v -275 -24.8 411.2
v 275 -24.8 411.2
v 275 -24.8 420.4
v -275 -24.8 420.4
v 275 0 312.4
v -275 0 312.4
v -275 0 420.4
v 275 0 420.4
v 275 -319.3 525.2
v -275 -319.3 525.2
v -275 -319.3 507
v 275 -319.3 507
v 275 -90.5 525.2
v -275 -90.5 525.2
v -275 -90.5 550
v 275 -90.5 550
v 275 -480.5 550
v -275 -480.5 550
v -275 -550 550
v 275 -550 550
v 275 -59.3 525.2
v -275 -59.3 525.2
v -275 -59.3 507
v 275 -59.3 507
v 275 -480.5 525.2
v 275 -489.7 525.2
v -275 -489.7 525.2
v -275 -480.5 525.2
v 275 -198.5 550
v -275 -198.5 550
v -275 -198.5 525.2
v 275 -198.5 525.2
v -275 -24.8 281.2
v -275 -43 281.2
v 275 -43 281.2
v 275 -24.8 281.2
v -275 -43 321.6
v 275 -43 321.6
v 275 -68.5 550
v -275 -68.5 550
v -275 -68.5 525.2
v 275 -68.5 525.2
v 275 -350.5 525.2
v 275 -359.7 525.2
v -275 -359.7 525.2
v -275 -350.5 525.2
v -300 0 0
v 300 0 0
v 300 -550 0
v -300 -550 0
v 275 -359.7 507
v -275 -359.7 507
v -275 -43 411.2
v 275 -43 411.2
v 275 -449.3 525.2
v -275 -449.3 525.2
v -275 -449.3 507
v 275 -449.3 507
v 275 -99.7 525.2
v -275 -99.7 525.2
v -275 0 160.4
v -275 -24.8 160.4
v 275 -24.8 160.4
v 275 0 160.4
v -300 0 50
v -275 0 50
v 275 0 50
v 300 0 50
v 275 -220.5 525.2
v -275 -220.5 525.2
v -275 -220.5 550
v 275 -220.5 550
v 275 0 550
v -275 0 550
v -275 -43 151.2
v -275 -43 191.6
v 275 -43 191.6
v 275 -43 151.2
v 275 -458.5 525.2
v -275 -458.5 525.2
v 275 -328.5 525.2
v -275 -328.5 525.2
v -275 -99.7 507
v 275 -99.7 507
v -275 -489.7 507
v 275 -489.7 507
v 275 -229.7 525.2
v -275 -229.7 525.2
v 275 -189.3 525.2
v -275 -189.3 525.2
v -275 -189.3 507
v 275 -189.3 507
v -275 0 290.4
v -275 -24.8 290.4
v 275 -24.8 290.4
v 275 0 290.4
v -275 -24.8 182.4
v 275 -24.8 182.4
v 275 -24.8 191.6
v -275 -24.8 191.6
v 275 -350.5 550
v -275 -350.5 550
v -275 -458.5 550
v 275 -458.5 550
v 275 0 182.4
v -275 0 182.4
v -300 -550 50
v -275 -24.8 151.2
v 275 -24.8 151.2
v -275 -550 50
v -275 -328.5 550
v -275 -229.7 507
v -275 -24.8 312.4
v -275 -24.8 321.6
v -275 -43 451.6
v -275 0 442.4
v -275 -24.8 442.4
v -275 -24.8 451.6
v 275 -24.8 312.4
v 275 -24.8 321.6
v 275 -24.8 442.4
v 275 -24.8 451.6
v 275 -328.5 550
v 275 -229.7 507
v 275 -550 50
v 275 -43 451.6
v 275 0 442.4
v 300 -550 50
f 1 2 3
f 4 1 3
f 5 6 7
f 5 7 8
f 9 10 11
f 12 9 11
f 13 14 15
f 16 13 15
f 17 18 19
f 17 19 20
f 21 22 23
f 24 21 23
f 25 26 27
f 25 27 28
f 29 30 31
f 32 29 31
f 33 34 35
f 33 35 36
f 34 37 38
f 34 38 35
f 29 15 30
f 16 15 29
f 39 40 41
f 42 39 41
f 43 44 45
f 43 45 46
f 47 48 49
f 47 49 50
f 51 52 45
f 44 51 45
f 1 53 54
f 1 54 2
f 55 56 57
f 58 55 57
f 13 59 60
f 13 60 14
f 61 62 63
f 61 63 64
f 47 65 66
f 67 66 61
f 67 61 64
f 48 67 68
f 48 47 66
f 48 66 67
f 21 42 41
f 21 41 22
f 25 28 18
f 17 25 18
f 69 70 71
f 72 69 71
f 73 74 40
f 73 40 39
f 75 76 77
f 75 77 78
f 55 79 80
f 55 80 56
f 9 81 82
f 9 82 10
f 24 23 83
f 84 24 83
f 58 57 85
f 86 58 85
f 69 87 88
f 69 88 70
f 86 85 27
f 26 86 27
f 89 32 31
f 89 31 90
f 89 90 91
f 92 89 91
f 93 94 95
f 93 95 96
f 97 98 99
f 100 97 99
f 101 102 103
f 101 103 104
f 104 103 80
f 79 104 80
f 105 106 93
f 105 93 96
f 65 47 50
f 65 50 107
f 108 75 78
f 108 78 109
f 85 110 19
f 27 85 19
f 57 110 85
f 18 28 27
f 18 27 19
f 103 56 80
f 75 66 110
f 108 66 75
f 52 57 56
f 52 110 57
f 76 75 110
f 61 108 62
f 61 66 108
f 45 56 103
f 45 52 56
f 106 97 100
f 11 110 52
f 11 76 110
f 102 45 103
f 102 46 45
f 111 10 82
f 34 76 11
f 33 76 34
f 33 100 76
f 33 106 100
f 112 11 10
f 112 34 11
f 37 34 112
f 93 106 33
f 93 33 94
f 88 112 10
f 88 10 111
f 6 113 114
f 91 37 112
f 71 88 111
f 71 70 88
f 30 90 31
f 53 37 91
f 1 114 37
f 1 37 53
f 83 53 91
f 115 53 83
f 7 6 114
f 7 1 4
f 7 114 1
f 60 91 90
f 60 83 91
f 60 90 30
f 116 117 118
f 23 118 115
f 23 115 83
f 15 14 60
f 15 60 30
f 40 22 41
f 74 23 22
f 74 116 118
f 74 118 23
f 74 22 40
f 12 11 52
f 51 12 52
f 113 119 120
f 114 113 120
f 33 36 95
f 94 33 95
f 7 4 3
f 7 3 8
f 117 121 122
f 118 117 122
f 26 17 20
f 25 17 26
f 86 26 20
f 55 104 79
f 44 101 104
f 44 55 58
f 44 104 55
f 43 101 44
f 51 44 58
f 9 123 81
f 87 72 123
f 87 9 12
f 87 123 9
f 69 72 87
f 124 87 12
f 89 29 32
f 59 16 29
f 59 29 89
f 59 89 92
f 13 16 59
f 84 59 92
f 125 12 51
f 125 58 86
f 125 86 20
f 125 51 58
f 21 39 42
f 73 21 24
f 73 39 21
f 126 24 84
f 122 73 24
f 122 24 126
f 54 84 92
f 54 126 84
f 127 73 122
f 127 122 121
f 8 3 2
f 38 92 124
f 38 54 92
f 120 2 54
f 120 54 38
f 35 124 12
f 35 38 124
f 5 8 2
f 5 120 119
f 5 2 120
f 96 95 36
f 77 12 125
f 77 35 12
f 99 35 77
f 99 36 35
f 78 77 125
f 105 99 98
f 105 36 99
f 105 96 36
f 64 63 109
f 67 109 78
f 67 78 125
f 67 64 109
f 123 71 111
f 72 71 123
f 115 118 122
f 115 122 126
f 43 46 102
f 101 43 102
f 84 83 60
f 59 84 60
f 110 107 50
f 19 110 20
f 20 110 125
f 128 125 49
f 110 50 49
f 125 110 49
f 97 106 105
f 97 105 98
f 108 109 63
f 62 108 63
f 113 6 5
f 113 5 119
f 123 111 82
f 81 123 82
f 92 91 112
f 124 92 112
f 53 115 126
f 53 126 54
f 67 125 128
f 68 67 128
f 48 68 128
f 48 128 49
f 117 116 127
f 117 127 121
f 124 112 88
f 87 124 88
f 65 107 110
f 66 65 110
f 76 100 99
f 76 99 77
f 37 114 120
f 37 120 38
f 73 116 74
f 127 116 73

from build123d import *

# Parameters (mm, degrees)
BOSS_EXTRUDE1_DEPTH = 550
CUT_EXTRUDE1_REACH  = 969.277
CUT_EXTRUDE2_REACH  = 969.277
LPATTERN1_COUNT     = 3
LPATTERN1_PITCH     = 130
LPATTERN2_COUNT     = 4
LPATTERN2_PITCH     = 130


with BuildPart() as part:
    # Sketch1 → Boss-Extrude1 (new body)
    with BuildSketch(Plane(origin=(0, 0, 0), x_dir=(1, 0, 0), z_dir=(0, 1, 0))):
        Polygon((300, 0), (-300, 0), (-300, -50), (-275, -50), (-275, -550), (275, -550), (275, -50), (300, -50), align=None)
    extrude(amount=-BOSS_EXTRUDE1_DEPTH)

    # Sketch2 → Cut-Extrude1 (cut, up to next)
    with BuildSketch(Plane.ZY.offset(275), mode=Mode.PRIVATE) as cut_extrude1_sk1:
        Polygon((442.4, 0), (442.4, -24.8), (451.6, -24.8), (451.6, -43), (411.2, -43), (411.2, -24.8), (420.4, -24.8), (420.4, 0), align=None)
    cut_extrude1_tool1 = extrude(cut_extrude1_sk1.sketch, amount=-CUT_EXTRUDE1_REACH, mode=Mode.PRIVATE) & part.part
    cut_extrude1 = cut_extrude1_tool1.solids().sort_by_distance((-275, -24.741921, 431.4))[0]
    add(cut_extrude1, mode=Mode.SUBTRACT)

    # Sketch3 → Cut-Extrude2 (cut, up to next)
    with BuildSketch(Plane.ZY.offset(275), mode=Mode.PRIVATE) as cut_extrude2_sk1:
        Polygon((550, -90.5), (550, -68.5), (525.2, -68.5), (525.2, -59.3), (507, -59.3), (507, -99.7), (525.2, -99.7), (525.2, -90.5), align=None)
    cut_extrude2_tool1 = extrude(cut_extrude2_sk1.sketch, amount=-CUT_EXTRUDE2_REACH, mode=Mode.PRIVATE) & part.part
    cut_extrude2 = cut_extrude2_tool1.solids().sort_by_distance((-275, -79.5, 525.258079))[0]
    add(cut_extrude2, mode=Mode.SUBTRACT)

    # LPattern1: Cut-Extrude1 ×3
    with Locations(*[(0, 0, -i * LPATTERN1_PITCH) for i in range(1, LPATTERN1_COUNT)]):
        add(cut_extrude1, mode=Mode.SUBTRACT)

    # LPattern2: Cut-Extrude2 ×4
    with Locations(*[(0, -i * LPATTERN2_PITCH, 0) for i in range(1, LPATTERN2_COUNT)]):
        add(cut_extrude2, mode=Mode.SUBTRACT)


solid = part.part
